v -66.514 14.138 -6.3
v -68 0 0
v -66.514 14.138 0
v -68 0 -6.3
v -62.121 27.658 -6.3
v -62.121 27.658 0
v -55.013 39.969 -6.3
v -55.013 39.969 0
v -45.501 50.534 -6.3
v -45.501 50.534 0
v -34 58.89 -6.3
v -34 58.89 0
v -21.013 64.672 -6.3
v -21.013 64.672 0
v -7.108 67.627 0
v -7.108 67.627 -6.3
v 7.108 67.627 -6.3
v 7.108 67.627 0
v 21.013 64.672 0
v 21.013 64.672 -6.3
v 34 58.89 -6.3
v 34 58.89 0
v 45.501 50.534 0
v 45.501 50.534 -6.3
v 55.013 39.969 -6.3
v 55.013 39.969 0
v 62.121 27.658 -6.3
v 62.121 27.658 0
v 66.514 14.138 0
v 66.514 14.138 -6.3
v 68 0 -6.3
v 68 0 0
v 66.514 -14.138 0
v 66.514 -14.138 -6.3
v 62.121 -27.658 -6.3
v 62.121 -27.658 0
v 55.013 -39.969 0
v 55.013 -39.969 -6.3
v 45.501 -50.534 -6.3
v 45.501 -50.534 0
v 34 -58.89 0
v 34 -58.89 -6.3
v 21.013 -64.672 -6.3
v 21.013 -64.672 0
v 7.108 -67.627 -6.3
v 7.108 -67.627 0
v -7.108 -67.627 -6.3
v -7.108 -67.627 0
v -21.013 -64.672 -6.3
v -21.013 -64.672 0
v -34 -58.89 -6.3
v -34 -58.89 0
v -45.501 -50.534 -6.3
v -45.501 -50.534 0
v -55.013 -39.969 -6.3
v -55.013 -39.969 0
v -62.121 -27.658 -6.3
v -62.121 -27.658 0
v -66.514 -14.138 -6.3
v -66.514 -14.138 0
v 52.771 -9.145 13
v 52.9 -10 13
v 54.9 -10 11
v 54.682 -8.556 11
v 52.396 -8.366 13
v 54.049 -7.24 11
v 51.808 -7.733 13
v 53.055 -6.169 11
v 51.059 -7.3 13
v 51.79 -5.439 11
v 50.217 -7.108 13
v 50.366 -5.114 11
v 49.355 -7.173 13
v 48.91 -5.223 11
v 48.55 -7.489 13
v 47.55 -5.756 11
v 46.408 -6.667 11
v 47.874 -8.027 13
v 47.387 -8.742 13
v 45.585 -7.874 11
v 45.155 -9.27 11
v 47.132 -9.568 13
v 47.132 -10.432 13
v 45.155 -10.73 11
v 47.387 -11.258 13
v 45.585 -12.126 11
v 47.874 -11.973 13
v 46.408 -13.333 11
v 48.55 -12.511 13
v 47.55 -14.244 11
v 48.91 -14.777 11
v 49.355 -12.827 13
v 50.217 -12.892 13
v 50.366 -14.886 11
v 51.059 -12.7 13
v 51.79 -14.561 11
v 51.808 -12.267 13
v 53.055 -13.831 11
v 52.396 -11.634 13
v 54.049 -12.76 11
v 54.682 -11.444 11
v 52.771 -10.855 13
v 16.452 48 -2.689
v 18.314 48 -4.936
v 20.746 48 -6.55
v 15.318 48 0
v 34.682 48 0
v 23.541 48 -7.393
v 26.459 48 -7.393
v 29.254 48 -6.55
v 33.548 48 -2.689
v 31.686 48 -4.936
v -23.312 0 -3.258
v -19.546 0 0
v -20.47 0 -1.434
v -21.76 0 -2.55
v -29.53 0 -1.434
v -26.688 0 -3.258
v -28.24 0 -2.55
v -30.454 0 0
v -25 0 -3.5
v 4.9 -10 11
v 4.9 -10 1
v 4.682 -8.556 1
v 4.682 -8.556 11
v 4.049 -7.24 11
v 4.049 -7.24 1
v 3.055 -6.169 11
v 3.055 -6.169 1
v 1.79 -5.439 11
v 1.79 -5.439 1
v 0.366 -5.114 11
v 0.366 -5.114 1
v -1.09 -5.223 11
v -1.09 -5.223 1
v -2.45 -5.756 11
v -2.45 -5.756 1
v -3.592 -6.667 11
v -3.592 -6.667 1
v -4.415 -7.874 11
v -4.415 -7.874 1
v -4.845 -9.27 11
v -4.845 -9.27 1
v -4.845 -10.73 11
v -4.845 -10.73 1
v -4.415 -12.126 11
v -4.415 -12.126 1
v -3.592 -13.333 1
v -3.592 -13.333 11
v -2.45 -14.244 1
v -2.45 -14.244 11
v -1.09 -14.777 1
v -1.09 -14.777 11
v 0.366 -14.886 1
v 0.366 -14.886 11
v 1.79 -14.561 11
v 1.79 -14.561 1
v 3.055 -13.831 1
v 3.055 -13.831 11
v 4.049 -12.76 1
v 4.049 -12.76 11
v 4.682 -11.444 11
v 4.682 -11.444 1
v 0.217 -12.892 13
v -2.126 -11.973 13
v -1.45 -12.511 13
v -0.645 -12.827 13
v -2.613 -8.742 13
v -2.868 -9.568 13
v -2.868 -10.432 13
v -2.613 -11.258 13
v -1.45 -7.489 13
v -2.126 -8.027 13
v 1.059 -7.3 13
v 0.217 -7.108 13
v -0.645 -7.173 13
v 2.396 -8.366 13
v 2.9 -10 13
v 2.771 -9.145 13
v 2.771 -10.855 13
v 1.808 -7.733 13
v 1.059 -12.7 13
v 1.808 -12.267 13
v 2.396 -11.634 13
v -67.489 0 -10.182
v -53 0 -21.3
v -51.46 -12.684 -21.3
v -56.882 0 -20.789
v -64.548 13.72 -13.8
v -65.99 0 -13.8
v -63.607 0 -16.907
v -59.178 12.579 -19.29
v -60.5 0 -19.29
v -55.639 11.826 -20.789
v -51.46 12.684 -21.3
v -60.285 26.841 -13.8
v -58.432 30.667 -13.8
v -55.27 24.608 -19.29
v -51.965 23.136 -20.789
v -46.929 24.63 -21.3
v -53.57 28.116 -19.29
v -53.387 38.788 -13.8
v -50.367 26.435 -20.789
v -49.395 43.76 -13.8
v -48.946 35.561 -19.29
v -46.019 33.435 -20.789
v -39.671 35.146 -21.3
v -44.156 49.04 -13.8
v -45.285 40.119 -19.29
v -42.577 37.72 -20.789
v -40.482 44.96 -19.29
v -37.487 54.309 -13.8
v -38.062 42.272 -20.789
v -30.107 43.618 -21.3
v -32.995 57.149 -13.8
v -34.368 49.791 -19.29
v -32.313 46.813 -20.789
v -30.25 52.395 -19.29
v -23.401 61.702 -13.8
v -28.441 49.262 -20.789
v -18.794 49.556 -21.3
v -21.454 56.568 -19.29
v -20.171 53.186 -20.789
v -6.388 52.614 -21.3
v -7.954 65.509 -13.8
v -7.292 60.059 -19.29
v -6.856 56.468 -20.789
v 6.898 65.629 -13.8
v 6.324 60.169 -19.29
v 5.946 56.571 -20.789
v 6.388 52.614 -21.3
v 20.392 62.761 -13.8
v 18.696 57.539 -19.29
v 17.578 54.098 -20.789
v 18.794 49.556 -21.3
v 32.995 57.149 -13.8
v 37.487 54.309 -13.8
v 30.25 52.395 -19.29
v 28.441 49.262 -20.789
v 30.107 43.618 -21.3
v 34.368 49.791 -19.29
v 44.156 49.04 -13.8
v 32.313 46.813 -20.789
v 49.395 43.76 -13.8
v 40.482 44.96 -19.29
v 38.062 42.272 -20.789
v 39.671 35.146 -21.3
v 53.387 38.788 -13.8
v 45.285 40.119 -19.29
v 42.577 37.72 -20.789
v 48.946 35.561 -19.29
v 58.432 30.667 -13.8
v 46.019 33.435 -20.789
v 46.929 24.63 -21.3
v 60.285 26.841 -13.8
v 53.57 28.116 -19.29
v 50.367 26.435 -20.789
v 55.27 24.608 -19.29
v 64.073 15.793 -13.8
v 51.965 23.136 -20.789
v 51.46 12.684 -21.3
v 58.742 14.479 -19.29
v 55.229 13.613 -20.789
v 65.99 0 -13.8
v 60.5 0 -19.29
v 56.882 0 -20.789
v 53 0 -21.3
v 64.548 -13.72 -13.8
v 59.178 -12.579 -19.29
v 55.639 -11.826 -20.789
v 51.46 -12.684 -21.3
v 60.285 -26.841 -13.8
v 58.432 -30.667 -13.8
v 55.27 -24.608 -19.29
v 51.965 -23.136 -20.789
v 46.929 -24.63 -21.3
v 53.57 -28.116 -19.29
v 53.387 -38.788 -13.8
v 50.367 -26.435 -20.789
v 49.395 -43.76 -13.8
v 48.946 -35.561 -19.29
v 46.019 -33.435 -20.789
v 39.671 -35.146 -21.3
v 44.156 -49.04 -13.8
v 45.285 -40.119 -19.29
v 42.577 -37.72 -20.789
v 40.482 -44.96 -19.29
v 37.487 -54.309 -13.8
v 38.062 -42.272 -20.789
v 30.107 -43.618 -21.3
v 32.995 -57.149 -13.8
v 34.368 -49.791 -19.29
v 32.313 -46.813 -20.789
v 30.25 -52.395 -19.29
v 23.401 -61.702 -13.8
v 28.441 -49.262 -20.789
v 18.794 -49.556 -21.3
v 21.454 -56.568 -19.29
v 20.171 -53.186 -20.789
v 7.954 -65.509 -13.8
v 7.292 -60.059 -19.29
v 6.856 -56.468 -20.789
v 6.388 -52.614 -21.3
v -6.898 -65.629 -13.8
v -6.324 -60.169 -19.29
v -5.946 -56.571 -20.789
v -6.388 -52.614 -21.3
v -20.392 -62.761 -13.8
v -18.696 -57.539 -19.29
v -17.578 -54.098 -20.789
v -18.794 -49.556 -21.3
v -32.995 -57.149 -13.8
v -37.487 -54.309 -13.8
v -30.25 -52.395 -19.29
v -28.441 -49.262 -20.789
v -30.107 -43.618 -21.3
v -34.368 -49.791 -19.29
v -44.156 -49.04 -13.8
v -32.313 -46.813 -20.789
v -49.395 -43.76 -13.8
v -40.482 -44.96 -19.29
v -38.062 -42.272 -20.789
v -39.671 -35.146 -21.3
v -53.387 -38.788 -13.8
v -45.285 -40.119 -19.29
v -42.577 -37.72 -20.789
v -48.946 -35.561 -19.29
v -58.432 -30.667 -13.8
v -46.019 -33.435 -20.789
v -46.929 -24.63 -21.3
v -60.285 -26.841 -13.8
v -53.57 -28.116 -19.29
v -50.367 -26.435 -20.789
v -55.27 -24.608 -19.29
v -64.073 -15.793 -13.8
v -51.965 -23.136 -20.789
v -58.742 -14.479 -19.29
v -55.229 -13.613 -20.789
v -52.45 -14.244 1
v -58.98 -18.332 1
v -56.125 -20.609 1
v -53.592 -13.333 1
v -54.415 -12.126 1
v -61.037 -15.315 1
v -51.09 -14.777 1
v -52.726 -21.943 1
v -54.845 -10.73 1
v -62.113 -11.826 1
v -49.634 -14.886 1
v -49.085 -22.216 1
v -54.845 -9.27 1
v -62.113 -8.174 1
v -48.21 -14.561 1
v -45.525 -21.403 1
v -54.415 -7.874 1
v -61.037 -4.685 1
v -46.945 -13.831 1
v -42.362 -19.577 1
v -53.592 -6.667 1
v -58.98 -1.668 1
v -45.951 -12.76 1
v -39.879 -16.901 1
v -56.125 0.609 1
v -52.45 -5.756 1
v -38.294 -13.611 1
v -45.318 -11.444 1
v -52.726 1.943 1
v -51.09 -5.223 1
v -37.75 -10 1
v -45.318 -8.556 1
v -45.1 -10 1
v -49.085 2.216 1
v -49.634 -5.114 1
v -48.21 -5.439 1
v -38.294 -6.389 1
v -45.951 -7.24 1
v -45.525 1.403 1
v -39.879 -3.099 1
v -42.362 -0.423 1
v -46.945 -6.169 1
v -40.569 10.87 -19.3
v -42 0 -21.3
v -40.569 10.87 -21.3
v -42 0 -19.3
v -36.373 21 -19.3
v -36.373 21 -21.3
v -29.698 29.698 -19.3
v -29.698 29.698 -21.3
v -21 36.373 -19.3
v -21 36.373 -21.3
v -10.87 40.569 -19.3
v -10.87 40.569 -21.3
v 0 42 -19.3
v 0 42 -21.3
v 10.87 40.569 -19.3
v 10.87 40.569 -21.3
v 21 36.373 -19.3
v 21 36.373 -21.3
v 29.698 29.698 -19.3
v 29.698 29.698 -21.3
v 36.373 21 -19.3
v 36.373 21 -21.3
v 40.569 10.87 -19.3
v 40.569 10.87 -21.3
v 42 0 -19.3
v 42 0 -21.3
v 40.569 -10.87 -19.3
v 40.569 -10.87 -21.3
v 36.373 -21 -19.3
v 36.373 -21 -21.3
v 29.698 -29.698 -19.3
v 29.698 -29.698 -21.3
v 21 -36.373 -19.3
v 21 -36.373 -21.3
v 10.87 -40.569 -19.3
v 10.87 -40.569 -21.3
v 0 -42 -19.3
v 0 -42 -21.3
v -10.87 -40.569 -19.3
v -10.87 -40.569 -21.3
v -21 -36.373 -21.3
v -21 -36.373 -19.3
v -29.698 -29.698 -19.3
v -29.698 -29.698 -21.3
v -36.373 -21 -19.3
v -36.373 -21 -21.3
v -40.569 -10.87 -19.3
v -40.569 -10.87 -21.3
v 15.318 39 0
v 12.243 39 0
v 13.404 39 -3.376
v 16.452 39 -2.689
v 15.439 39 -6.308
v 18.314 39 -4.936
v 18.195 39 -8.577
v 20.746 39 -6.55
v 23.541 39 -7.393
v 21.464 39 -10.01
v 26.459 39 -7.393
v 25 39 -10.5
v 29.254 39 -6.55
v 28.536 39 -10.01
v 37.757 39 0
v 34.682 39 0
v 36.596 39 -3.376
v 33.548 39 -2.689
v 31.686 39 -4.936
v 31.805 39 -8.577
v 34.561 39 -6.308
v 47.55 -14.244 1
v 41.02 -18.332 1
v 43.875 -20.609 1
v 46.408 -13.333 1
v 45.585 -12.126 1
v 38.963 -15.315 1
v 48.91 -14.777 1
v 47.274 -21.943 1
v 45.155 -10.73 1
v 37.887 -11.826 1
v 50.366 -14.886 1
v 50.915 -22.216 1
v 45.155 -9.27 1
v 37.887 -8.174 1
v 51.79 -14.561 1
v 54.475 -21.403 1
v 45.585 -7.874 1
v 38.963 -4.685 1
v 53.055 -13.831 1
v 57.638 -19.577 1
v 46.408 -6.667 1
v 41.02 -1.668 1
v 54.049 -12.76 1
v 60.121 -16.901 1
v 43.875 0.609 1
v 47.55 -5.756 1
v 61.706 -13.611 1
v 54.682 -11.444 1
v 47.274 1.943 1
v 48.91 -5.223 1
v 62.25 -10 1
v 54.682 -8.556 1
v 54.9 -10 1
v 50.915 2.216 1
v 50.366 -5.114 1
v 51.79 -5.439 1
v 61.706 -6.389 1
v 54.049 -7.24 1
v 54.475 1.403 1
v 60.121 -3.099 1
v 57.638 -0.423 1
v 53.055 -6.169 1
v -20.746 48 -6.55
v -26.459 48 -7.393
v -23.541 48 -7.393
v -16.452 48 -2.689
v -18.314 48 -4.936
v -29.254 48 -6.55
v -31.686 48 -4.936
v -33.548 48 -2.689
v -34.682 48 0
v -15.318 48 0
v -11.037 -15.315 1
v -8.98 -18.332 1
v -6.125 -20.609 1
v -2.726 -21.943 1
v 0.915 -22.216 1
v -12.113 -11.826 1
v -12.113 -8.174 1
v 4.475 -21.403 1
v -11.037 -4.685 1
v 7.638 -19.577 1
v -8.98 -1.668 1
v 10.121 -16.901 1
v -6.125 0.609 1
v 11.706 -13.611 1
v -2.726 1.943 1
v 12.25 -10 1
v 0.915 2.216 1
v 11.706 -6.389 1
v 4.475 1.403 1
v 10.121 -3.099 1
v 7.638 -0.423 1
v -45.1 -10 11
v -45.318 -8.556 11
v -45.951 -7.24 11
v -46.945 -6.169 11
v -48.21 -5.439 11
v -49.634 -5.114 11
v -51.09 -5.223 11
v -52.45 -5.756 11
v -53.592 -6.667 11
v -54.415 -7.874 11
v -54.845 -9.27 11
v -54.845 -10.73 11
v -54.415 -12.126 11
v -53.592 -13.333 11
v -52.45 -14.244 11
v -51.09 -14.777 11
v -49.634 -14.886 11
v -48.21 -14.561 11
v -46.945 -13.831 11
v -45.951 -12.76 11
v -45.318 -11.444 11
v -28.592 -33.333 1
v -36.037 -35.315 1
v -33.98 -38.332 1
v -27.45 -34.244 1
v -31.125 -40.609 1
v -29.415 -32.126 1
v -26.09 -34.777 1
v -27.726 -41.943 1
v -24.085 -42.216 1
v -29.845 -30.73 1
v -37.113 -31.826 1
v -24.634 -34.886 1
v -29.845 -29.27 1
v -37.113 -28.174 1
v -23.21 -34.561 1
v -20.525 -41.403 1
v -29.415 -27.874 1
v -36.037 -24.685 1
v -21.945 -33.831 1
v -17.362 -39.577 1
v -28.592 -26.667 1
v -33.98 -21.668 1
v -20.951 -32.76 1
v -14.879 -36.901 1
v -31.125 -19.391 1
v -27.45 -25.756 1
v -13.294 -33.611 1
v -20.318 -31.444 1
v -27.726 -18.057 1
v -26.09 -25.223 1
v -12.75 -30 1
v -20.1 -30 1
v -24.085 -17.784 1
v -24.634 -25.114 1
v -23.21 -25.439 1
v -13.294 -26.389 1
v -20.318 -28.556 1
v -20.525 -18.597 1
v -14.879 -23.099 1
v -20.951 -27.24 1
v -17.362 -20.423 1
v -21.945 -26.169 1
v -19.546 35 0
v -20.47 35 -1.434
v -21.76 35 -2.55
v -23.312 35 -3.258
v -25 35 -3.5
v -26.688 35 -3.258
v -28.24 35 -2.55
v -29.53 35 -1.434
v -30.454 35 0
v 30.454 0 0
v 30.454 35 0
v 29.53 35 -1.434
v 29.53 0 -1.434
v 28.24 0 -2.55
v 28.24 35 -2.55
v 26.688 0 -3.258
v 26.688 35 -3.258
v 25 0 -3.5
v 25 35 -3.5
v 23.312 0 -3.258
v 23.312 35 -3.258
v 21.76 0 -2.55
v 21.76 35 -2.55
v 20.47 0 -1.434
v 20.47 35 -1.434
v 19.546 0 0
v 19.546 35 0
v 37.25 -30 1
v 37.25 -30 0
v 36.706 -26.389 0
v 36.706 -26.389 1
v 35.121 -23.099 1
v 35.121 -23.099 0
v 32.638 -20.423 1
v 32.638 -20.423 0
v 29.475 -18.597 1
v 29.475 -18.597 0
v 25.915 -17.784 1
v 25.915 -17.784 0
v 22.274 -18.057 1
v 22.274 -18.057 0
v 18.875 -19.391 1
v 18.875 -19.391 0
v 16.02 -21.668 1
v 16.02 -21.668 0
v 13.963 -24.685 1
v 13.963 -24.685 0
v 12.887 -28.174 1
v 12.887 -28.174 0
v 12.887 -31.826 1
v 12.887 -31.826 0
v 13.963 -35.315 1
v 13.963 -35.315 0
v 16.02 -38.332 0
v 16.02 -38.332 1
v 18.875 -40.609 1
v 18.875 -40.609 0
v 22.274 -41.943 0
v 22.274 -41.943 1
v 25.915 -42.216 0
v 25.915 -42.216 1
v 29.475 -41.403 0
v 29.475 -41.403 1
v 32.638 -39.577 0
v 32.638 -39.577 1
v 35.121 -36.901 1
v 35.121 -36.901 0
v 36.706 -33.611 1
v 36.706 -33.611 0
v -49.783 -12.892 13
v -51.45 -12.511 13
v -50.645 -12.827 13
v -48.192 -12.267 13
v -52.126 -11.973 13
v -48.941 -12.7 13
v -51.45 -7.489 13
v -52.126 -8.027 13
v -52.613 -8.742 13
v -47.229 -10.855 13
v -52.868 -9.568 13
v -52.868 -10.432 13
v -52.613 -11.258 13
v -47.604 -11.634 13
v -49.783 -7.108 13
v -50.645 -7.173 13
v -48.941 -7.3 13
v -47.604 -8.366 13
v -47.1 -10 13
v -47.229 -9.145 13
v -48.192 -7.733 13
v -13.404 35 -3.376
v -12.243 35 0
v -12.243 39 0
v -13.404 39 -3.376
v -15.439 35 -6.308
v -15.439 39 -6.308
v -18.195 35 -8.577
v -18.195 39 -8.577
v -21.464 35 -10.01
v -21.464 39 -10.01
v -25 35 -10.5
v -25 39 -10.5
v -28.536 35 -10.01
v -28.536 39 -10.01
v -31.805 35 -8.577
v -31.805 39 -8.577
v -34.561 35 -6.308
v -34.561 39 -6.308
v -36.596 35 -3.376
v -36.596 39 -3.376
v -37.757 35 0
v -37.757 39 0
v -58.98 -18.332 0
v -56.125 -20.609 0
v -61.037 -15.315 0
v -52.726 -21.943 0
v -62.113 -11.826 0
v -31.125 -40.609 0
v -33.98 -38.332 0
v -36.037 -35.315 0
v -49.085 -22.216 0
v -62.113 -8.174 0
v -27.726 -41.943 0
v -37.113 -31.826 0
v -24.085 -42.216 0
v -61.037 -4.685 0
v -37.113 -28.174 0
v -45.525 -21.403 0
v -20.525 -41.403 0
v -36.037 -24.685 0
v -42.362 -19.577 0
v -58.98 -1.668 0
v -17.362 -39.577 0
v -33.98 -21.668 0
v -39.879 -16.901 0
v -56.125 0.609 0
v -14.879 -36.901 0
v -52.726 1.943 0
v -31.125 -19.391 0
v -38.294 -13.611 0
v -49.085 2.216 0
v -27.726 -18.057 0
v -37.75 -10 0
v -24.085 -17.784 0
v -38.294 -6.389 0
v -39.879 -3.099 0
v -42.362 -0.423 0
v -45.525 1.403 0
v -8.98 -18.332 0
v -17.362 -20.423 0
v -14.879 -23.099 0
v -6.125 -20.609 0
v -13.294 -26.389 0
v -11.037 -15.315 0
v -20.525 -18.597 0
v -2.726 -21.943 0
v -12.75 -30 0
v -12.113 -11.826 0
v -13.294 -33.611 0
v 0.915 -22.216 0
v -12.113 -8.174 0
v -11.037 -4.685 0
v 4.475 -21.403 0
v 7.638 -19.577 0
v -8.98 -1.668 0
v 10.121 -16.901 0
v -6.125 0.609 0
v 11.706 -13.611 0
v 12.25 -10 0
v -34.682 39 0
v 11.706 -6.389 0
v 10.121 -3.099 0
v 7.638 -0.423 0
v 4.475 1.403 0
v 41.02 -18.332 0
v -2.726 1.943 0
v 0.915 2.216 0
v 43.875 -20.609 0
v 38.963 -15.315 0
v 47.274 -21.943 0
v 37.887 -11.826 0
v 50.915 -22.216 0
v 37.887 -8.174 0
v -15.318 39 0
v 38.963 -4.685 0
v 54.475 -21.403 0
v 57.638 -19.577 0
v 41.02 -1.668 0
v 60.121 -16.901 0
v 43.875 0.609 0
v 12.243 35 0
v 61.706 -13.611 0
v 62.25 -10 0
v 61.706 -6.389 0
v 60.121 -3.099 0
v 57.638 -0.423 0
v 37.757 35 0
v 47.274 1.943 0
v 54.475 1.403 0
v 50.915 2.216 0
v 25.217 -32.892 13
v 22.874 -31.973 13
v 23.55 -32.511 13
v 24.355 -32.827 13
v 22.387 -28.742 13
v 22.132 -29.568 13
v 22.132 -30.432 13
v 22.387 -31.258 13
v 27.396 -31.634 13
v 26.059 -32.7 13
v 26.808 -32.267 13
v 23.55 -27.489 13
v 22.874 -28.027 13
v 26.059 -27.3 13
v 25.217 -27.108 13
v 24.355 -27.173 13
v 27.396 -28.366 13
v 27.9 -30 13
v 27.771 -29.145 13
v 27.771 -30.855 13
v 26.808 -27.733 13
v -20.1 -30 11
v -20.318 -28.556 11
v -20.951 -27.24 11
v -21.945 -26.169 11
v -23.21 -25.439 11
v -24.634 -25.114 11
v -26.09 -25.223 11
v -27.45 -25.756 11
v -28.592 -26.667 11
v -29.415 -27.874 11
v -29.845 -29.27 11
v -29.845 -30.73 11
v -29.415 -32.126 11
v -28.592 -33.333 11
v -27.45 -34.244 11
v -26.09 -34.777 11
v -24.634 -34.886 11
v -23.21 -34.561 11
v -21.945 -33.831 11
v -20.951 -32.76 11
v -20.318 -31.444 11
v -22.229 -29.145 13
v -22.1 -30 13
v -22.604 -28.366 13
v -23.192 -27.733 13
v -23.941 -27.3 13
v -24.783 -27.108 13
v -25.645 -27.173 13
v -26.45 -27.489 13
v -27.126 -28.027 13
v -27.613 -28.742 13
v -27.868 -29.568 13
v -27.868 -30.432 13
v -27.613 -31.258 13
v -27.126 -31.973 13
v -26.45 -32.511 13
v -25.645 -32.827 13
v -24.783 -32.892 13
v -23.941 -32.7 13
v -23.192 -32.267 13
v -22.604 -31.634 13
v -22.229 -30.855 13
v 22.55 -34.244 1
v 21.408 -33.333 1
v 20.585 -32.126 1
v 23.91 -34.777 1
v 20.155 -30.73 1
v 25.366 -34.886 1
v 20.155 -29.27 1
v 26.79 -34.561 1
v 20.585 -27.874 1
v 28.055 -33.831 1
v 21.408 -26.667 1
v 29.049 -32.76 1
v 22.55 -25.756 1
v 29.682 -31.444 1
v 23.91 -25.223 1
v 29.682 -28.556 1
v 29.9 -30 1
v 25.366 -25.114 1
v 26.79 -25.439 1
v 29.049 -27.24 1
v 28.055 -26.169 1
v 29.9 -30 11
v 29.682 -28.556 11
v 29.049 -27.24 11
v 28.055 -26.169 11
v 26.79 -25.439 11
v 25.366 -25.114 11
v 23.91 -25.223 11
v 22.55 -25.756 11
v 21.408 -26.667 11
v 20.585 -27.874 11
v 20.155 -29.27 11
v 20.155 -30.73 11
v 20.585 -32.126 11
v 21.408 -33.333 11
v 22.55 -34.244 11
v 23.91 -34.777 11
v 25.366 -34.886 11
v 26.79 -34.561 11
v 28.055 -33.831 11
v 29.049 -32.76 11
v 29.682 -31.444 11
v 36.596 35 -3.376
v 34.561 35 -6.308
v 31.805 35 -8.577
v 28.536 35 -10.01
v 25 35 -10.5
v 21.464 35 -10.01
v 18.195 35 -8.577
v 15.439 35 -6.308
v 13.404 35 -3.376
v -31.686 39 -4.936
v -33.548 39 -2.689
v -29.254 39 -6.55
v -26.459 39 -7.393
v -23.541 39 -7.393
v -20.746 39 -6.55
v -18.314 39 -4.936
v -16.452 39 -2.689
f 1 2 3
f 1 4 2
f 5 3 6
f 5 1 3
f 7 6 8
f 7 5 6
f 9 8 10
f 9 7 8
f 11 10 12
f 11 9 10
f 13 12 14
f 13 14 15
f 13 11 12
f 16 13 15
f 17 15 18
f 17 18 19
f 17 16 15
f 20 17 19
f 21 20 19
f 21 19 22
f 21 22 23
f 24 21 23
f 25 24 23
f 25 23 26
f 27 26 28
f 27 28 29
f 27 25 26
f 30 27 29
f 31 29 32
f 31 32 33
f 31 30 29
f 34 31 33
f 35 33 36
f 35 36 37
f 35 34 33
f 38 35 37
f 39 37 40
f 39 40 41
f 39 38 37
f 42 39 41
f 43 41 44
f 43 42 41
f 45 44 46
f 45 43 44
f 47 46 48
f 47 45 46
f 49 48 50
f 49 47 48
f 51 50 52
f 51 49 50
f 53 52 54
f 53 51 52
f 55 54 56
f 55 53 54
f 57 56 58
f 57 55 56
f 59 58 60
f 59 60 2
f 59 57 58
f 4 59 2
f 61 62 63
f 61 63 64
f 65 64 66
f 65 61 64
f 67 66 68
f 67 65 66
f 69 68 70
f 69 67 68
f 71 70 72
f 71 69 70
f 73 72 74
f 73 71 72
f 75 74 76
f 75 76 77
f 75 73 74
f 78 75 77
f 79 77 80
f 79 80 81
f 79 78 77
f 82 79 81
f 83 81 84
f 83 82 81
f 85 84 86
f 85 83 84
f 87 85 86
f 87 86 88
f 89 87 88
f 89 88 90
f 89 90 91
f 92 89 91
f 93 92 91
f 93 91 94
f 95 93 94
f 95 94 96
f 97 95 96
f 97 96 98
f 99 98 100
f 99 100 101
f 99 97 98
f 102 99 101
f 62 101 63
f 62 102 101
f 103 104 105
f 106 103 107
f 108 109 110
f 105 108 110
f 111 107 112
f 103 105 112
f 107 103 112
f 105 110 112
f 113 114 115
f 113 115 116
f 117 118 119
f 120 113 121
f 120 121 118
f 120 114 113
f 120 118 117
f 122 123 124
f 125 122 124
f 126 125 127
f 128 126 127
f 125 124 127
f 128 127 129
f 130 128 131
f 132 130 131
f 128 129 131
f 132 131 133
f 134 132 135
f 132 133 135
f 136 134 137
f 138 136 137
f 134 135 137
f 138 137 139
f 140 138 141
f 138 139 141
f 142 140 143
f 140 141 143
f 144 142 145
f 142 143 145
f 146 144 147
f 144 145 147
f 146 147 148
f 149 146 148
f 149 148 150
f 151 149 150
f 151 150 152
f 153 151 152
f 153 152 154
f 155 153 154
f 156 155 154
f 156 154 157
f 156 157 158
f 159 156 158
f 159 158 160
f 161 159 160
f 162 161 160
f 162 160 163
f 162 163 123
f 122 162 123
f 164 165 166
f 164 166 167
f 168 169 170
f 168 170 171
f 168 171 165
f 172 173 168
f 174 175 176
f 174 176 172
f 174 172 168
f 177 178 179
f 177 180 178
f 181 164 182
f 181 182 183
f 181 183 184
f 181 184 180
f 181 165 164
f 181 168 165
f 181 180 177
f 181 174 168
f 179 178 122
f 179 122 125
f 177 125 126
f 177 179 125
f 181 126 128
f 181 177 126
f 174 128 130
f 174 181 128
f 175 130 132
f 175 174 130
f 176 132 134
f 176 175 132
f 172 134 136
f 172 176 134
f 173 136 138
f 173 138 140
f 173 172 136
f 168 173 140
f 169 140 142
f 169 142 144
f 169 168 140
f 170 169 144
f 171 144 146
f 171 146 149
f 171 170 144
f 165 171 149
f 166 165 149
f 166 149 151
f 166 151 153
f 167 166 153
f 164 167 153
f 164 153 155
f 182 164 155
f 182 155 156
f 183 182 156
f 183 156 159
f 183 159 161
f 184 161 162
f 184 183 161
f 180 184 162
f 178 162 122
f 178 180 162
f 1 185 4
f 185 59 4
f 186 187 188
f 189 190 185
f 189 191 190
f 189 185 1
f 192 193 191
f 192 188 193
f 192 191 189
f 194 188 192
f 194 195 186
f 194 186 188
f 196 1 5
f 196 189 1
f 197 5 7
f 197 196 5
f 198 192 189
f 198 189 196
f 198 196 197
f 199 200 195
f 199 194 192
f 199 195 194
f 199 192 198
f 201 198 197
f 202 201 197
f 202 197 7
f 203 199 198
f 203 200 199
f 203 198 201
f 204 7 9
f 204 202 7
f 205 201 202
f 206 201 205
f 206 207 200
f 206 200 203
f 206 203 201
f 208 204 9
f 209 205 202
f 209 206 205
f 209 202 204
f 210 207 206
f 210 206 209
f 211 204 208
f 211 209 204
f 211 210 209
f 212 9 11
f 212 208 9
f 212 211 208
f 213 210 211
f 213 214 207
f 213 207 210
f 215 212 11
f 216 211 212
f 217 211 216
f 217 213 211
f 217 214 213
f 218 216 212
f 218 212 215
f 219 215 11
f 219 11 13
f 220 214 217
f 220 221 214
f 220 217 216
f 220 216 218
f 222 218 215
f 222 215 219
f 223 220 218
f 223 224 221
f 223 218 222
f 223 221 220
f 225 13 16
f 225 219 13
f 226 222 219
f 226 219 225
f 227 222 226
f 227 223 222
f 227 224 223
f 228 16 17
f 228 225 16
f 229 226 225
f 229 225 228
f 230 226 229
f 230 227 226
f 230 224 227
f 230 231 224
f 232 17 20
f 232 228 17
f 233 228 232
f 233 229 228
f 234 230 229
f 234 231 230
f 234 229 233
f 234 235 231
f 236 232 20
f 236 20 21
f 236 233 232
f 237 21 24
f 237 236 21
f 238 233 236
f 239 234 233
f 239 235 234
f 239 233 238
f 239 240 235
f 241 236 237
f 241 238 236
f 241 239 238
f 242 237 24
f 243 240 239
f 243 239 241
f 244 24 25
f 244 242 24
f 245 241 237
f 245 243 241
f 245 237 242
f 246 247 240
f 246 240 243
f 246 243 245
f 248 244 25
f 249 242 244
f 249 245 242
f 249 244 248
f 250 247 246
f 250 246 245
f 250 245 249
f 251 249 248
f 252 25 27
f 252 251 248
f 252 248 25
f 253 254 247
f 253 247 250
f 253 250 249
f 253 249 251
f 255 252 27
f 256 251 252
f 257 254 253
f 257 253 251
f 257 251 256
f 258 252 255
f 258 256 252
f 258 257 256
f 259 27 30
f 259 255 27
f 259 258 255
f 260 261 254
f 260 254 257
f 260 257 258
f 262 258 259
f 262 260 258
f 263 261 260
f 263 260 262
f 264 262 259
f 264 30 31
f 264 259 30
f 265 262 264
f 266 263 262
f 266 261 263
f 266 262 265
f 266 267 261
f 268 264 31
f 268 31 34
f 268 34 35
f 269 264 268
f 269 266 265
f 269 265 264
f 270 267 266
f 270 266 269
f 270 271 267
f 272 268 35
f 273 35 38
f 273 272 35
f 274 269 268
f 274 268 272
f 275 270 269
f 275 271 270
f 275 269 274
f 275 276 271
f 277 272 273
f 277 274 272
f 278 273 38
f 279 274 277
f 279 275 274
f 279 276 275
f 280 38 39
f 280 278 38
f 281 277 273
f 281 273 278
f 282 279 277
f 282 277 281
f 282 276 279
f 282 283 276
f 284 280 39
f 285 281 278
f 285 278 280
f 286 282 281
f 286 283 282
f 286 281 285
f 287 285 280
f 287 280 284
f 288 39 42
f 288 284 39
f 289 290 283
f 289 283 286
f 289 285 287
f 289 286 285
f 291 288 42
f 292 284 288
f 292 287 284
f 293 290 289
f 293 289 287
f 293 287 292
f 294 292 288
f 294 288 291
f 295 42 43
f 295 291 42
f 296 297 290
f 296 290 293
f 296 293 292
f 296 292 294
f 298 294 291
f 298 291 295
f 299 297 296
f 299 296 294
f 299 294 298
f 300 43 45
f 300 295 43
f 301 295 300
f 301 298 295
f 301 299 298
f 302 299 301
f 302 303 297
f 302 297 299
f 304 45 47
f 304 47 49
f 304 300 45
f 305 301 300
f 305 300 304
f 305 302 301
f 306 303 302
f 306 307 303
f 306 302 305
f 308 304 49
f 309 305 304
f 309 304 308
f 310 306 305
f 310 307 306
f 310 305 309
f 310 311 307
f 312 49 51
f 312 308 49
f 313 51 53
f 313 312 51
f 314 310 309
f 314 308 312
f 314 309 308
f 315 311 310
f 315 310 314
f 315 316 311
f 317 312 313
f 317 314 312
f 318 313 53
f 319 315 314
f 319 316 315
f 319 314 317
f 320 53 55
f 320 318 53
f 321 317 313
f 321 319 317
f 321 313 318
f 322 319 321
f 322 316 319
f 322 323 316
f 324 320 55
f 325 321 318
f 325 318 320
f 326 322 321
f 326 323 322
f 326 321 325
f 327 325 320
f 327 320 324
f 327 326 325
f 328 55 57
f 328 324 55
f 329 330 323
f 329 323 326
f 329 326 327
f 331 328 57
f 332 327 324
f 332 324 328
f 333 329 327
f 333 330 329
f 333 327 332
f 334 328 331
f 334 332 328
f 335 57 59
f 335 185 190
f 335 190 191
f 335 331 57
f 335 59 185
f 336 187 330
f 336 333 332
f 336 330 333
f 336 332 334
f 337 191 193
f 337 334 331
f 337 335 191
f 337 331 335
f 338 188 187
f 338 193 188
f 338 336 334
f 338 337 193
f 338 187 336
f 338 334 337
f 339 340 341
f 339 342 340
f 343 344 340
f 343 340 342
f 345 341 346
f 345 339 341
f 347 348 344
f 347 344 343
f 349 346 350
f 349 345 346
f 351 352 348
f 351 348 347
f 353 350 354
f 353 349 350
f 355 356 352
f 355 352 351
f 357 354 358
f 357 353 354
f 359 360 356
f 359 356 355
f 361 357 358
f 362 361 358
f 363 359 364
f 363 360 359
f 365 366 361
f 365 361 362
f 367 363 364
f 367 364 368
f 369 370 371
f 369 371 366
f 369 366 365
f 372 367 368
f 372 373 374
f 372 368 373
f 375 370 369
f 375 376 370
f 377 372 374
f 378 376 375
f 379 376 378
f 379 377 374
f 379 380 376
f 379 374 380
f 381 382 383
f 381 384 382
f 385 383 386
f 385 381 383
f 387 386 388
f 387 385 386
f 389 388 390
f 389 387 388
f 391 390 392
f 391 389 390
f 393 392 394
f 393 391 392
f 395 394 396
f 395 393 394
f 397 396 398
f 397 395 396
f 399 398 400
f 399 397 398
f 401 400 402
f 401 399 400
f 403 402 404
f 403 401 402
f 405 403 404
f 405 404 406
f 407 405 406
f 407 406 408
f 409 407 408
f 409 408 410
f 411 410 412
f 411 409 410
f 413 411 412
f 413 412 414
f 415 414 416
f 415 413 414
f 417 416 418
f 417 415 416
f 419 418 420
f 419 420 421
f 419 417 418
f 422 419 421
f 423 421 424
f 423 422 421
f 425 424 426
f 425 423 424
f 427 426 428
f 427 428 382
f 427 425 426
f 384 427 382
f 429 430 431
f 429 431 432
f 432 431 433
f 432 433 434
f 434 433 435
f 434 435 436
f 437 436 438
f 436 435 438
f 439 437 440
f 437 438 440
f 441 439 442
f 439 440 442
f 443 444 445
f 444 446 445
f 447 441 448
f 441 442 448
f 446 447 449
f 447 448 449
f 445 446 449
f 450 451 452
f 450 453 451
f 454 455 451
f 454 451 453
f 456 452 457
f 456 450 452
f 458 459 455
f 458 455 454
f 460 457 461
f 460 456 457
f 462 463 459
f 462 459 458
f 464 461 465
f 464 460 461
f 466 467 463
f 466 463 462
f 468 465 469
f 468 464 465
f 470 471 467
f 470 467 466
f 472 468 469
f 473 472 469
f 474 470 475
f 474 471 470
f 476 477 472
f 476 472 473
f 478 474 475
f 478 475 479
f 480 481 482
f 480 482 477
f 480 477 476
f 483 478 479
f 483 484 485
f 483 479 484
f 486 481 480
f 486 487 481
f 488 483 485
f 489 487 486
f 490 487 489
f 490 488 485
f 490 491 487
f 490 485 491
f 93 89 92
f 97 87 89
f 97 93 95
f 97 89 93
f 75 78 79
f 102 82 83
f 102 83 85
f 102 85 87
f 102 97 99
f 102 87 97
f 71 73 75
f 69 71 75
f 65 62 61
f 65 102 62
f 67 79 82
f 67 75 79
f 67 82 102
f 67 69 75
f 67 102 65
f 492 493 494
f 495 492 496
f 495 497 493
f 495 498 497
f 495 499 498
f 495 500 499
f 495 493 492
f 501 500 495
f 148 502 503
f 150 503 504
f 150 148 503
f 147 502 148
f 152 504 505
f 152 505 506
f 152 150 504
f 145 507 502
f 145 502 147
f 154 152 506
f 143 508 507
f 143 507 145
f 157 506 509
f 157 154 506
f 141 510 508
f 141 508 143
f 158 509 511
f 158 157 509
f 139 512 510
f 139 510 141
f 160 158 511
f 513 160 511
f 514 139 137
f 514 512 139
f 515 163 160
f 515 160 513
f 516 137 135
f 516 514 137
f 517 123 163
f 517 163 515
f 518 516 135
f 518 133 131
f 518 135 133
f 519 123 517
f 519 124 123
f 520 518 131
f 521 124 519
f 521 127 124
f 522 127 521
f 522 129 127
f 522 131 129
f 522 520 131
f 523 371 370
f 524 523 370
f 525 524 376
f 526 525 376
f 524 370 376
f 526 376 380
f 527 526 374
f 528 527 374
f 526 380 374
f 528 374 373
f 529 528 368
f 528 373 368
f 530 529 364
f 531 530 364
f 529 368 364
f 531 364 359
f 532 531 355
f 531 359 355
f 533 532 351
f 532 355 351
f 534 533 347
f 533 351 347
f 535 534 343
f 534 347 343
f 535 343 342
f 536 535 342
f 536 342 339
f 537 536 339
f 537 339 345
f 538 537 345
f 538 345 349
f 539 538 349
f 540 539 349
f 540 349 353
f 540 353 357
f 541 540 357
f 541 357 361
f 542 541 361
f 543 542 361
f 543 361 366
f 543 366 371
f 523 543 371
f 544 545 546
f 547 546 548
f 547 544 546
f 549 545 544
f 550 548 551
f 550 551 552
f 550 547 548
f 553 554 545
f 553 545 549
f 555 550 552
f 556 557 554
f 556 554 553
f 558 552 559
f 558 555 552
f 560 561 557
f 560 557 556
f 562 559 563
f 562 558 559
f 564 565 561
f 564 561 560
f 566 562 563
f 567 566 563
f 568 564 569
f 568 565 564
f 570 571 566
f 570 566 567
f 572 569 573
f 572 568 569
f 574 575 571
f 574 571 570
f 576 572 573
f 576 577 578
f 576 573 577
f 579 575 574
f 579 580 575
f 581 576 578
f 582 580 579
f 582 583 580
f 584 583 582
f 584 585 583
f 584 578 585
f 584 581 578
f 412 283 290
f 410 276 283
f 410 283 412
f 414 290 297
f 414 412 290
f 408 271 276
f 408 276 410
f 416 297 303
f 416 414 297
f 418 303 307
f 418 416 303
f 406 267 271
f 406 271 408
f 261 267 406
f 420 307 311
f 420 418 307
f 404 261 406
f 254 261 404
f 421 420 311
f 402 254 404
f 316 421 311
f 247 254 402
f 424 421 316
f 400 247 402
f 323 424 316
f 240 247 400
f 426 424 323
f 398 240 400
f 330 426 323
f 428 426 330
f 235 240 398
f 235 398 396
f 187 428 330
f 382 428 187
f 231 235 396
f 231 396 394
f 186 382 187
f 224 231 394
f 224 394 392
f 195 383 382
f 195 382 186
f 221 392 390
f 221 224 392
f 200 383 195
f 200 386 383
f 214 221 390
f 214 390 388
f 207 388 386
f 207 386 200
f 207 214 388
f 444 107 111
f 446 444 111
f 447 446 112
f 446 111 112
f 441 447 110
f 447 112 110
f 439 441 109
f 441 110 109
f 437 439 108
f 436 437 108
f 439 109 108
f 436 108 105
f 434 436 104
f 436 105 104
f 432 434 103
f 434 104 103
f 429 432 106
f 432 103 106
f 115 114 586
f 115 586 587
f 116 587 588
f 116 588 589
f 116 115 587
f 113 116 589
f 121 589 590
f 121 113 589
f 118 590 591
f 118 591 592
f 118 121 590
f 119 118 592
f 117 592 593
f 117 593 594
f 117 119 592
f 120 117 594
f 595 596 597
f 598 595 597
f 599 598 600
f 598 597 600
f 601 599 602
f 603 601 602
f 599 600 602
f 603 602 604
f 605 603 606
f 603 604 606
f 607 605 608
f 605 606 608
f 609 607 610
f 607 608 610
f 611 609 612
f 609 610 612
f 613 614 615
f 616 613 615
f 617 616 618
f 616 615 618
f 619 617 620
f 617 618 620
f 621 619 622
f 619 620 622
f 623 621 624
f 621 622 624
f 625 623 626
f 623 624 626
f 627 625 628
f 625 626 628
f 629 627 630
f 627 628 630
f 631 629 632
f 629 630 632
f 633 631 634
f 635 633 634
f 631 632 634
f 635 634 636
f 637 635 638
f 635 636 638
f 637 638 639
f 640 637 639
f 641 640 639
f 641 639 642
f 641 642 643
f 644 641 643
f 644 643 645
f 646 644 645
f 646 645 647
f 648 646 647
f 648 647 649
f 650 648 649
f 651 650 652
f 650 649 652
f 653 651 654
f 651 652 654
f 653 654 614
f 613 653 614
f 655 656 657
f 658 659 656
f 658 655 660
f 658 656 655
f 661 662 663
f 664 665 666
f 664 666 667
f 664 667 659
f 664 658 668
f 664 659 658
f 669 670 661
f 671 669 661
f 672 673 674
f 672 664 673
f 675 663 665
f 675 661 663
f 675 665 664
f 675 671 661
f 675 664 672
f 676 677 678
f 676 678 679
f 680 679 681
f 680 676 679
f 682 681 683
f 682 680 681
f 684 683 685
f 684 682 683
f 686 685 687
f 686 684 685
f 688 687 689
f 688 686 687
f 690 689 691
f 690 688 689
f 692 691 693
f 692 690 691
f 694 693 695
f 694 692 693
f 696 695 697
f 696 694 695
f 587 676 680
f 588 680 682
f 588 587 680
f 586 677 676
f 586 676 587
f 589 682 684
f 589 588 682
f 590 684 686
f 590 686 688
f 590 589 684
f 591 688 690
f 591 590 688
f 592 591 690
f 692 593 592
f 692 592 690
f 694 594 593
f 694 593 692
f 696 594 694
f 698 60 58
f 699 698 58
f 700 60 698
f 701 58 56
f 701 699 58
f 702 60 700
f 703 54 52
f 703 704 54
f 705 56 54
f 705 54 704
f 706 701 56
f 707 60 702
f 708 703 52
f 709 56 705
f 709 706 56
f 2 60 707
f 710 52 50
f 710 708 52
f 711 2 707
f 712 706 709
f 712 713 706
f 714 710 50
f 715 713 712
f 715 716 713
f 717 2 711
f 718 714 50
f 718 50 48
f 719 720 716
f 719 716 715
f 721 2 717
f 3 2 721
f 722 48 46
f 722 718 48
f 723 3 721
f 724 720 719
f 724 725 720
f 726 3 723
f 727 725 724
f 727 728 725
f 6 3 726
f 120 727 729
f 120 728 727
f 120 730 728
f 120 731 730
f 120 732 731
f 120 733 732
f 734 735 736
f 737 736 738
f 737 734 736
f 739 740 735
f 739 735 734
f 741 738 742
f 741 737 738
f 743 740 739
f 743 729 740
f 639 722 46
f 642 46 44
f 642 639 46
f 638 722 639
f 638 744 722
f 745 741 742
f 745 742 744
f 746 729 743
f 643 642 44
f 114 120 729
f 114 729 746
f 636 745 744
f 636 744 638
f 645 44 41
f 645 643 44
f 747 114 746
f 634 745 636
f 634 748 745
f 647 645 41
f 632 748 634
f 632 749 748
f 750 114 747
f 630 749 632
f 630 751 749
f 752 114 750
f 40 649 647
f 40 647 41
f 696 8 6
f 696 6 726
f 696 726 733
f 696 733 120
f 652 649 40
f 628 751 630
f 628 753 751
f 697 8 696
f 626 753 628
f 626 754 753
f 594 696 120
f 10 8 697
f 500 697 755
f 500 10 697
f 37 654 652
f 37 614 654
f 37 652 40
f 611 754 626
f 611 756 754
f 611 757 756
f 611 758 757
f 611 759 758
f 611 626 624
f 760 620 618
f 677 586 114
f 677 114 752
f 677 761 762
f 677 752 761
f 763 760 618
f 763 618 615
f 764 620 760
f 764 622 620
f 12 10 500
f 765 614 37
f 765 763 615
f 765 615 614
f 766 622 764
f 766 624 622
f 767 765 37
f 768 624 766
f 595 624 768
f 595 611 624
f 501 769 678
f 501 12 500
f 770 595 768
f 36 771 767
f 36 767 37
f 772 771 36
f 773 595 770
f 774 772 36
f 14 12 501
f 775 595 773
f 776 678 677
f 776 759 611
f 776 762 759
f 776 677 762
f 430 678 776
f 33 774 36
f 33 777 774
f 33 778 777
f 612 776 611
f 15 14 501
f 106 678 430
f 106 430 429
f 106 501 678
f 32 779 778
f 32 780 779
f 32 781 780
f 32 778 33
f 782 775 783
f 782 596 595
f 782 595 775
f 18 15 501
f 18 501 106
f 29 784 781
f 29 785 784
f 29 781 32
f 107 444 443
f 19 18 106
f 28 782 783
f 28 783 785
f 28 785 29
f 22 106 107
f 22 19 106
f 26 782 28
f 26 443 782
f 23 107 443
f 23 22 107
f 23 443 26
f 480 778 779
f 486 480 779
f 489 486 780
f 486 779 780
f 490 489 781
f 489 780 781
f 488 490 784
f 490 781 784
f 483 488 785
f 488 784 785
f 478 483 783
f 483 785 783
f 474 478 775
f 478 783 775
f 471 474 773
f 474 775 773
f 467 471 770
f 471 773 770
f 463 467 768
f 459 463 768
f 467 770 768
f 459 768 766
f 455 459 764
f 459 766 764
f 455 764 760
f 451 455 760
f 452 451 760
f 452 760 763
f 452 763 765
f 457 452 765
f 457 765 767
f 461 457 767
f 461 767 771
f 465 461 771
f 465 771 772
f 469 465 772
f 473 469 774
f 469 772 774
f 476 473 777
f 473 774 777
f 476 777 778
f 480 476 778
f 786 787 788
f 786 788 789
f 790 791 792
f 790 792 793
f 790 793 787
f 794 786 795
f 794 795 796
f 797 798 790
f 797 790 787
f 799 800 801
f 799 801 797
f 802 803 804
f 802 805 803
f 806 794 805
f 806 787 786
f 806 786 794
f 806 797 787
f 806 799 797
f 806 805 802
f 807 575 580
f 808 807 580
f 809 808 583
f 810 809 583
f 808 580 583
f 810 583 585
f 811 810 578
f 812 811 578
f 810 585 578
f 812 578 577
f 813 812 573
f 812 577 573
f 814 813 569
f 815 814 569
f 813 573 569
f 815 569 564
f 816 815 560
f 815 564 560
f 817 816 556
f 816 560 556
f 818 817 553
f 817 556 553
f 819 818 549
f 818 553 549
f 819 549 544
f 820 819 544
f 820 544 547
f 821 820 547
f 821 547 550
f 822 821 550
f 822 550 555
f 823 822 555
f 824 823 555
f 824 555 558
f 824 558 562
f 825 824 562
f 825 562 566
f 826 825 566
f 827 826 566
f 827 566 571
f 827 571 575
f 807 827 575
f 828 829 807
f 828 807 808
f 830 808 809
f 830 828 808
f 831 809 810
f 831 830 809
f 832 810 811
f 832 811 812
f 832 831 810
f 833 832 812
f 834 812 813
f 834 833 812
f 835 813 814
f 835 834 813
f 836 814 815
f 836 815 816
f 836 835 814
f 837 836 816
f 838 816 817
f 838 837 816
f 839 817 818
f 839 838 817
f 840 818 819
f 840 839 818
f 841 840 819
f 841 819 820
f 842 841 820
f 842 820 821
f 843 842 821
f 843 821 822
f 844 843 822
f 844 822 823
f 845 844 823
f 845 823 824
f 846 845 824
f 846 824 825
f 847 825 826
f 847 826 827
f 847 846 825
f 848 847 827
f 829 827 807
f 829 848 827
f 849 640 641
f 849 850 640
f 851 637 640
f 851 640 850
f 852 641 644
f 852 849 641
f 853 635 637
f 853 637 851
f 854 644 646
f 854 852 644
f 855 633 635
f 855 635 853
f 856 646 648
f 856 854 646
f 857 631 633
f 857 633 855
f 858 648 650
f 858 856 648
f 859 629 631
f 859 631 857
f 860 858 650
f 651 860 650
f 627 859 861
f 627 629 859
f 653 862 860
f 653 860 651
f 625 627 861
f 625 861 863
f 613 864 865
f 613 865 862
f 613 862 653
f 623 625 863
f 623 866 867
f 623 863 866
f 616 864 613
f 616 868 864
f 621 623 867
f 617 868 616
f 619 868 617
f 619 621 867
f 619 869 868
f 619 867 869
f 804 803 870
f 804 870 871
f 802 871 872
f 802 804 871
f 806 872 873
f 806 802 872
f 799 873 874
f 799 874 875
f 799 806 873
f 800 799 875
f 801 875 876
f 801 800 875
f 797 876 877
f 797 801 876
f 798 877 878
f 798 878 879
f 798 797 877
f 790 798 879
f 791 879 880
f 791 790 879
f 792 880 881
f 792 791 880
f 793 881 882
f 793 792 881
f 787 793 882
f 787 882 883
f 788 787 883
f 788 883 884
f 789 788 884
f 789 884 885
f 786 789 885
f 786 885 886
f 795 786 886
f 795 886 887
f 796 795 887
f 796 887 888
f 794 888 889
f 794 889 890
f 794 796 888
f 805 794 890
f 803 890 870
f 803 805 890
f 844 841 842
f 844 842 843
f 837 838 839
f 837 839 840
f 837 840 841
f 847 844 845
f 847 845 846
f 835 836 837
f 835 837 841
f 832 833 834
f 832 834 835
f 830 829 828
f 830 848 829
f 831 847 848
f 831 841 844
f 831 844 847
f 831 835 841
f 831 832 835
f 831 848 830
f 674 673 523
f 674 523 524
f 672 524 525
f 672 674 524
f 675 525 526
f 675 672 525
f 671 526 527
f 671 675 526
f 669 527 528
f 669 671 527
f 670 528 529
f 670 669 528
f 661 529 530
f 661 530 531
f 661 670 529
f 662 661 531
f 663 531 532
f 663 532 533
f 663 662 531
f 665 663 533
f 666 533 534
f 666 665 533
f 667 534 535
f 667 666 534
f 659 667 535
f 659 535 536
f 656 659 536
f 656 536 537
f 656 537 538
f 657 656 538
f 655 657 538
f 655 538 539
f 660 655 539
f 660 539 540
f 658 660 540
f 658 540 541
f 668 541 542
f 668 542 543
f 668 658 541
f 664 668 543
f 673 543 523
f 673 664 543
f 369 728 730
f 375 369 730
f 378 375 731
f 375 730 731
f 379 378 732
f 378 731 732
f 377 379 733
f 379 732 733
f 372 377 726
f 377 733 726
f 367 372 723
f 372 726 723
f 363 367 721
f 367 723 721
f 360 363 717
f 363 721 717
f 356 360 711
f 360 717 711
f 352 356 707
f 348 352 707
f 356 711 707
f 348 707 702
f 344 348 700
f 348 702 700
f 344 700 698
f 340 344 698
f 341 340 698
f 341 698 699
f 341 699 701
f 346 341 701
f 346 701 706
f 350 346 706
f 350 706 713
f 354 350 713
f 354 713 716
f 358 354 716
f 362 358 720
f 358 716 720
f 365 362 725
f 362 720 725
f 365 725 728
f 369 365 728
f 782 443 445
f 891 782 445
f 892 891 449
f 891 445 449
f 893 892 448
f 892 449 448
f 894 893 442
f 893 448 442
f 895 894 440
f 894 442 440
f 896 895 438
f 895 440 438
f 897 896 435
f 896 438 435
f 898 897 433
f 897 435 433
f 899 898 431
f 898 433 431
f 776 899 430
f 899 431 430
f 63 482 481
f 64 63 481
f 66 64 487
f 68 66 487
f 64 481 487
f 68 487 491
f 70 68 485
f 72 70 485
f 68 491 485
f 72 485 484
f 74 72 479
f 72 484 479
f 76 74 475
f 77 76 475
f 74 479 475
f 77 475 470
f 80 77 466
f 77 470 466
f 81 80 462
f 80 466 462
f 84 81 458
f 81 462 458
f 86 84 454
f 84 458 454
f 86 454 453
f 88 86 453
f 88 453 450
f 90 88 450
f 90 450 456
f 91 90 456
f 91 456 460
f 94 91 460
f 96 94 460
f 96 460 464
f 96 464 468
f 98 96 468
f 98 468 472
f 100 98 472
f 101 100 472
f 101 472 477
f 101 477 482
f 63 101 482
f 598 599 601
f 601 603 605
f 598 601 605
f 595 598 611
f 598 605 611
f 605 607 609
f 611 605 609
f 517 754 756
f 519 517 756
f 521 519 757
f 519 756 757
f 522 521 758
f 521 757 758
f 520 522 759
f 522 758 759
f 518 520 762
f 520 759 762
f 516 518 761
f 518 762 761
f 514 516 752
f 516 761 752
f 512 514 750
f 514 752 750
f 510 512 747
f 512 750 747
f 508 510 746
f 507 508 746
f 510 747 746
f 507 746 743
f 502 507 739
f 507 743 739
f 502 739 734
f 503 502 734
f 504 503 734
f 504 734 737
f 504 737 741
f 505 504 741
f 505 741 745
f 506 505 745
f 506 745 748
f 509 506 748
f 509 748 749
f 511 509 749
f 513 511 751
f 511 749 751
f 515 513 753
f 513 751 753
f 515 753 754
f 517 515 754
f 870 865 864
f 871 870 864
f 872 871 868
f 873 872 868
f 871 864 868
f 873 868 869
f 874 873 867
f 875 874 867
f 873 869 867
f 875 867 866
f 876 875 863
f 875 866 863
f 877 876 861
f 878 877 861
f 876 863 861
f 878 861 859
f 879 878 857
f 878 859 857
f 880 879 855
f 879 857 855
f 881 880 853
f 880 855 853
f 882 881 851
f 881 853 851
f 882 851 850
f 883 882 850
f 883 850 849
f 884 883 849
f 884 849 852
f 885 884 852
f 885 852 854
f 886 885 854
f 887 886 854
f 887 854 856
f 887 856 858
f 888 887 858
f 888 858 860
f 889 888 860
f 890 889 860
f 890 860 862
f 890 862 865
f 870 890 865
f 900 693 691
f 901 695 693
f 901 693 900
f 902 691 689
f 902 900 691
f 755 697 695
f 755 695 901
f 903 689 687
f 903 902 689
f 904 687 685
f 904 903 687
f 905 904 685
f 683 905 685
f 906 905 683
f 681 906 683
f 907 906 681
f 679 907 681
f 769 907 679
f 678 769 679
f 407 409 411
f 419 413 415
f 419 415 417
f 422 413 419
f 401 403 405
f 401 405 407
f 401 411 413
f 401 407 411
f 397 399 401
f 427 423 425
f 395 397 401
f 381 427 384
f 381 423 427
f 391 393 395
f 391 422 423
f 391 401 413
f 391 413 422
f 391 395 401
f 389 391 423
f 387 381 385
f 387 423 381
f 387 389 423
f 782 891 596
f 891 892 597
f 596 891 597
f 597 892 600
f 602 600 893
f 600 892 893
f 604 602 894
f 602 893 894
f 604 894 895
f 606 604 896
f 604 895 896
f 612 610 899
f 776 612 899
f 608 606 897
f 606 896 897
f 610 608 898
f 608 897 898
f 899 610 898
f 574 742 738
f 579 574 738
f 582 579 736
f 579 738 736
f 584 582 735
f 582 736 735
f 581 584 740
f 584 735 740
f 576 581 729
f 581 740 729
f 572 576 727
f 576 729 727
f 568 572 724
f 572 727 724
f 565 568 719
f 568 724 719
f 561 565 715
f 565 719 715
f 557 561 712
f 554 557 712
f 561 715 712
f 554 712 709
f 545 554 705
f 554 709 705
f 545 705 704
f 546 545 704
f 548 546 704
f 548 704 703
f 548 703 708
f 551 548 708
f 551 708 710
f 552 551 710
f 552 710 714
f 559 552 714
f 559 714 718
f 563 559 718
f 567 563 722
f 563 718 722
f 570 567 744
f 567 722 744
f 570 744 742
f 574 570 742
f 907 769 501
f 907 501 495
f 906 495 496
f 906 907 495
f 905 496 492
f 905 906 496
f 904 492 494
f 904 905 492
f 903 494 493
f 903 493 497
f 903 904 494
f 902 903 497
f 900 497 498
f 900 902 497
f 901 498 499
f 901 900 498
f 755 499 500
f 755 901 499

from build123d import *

# Parameters (mm, degrees)
F2_R     = 4.9
F3_DEPTH = 13
F2_R_2   = 12.25
F4_DEPTH = 1
F5_SIZE  = 2


with BuildPart() as f1:
    # F0 (on Front) → F1 (revolve)
    with BuildSketch(Plane.XZ):
        with BuildLine():
            Line((0, -19.3), (0, 0))
            Line((0, 0), (-68, 0))
            Line((-68, 0), (-68, -6.3))
            ThreePointArc((-68, -6.3), (-63.6066017178, -16.9066017178), (-53, -21.3))
            Line((-53, -21.3), (-42, -21.3))
            Line((-42, -21.3), (-42, -19.3))
            Line((-42, -19.3), (0, -19.3))
        make_face()
    revolve(axis=Axis((0, 0, -9.65), (0, 0, -1)))

    # F2 (on face) → F3 (join)
    with BuildSketch(Plane.XY):
        with Locations((-50, -10)):
            Circle(F2_R)
        with Locations((-25, -30)):
            Circle(F2_R)
        with Locations((0, -10)):
            Circle(F2_R)
        with Locations((25, -30)):
            Circle(F2_R)
        with Locations((50, -10)):
            Circle(F2_R)
    extrude(amount=F3_DEPTH)

    # F2 (on face) → F4 (join)
    with BuildSketch(Plane.XY):
        with Locations((-50, -10)):
            Circle(F2_R_2)
        with Locations((-50, -10)):
            Circle(F2_R, mode=Mode.SUBTRACT)
        with Locations((-25, -30)):
            Circle(F2_R_2)
        with Locations((-25, -30)):
            Circle(F2_R, mode=Mode.SUBTRACT)
        with Locations((0, -10)):
            Circle(F2_R_2)
        with Locations((0, -10)):
            Circle(F2_R, mode=Mode.SUBTRACT)
        with Locations((25, -30)):
            Circle(F2_R_2)
        with Locations((25, -30)):
            Circle(F2_R, mode=Mode.SUBTRACT)
        with Locations((50, -10)):
            Circle(F2_R_2)
        with Locations((50, -10)):
            Circle(F2_R, mode=Mode.SUBTRACT)
    extrude(amount=F4_DEPTH)

    # F5
    f5_edges = [f1.edges().sort_by_distance(p)[0] for p in [
        (-54.9, -10, 13),
        (-29.9, -30, 13),
        (-4.9, -10, 13),
        (20.1, -30, 13),
        (45.1, -10, 13),
    ]]
    chamfer(f5_edges, length=F5_SIZE)

    # F7 (on offset) → F8 (revolve, cut)
    with BuildSketch(Plane.XY.offset(2.5)):
        Polygon((-31, 0), (-25, 0), (-25, 35), (-25, 39), (-25, 48), (-35, 48), (-35, 39), (-38, 39), (-38, 35), (-31, 35), align=None)
    revolve(axis=Axis((-25, 17.5, 2.5), (0, 1, 0)), mode=Mode.SUBTRACT)

    # F7 (on offset) → F9 (revolve, cut)
    with BuildSketch(Plane.XY.offset(2.5)):
        Polygon((25, 35), (25, 0), (31, 0), (31, 35), (38, 35), (38, 39), (35, 39), (35, 48), (25, 48), (25, 39), align=None)
    revolve(axis=Axis((25, 17.5, 2.5), (0, 1, 0)), mode=Mode.SUBTRACT)


solid = f1.part
